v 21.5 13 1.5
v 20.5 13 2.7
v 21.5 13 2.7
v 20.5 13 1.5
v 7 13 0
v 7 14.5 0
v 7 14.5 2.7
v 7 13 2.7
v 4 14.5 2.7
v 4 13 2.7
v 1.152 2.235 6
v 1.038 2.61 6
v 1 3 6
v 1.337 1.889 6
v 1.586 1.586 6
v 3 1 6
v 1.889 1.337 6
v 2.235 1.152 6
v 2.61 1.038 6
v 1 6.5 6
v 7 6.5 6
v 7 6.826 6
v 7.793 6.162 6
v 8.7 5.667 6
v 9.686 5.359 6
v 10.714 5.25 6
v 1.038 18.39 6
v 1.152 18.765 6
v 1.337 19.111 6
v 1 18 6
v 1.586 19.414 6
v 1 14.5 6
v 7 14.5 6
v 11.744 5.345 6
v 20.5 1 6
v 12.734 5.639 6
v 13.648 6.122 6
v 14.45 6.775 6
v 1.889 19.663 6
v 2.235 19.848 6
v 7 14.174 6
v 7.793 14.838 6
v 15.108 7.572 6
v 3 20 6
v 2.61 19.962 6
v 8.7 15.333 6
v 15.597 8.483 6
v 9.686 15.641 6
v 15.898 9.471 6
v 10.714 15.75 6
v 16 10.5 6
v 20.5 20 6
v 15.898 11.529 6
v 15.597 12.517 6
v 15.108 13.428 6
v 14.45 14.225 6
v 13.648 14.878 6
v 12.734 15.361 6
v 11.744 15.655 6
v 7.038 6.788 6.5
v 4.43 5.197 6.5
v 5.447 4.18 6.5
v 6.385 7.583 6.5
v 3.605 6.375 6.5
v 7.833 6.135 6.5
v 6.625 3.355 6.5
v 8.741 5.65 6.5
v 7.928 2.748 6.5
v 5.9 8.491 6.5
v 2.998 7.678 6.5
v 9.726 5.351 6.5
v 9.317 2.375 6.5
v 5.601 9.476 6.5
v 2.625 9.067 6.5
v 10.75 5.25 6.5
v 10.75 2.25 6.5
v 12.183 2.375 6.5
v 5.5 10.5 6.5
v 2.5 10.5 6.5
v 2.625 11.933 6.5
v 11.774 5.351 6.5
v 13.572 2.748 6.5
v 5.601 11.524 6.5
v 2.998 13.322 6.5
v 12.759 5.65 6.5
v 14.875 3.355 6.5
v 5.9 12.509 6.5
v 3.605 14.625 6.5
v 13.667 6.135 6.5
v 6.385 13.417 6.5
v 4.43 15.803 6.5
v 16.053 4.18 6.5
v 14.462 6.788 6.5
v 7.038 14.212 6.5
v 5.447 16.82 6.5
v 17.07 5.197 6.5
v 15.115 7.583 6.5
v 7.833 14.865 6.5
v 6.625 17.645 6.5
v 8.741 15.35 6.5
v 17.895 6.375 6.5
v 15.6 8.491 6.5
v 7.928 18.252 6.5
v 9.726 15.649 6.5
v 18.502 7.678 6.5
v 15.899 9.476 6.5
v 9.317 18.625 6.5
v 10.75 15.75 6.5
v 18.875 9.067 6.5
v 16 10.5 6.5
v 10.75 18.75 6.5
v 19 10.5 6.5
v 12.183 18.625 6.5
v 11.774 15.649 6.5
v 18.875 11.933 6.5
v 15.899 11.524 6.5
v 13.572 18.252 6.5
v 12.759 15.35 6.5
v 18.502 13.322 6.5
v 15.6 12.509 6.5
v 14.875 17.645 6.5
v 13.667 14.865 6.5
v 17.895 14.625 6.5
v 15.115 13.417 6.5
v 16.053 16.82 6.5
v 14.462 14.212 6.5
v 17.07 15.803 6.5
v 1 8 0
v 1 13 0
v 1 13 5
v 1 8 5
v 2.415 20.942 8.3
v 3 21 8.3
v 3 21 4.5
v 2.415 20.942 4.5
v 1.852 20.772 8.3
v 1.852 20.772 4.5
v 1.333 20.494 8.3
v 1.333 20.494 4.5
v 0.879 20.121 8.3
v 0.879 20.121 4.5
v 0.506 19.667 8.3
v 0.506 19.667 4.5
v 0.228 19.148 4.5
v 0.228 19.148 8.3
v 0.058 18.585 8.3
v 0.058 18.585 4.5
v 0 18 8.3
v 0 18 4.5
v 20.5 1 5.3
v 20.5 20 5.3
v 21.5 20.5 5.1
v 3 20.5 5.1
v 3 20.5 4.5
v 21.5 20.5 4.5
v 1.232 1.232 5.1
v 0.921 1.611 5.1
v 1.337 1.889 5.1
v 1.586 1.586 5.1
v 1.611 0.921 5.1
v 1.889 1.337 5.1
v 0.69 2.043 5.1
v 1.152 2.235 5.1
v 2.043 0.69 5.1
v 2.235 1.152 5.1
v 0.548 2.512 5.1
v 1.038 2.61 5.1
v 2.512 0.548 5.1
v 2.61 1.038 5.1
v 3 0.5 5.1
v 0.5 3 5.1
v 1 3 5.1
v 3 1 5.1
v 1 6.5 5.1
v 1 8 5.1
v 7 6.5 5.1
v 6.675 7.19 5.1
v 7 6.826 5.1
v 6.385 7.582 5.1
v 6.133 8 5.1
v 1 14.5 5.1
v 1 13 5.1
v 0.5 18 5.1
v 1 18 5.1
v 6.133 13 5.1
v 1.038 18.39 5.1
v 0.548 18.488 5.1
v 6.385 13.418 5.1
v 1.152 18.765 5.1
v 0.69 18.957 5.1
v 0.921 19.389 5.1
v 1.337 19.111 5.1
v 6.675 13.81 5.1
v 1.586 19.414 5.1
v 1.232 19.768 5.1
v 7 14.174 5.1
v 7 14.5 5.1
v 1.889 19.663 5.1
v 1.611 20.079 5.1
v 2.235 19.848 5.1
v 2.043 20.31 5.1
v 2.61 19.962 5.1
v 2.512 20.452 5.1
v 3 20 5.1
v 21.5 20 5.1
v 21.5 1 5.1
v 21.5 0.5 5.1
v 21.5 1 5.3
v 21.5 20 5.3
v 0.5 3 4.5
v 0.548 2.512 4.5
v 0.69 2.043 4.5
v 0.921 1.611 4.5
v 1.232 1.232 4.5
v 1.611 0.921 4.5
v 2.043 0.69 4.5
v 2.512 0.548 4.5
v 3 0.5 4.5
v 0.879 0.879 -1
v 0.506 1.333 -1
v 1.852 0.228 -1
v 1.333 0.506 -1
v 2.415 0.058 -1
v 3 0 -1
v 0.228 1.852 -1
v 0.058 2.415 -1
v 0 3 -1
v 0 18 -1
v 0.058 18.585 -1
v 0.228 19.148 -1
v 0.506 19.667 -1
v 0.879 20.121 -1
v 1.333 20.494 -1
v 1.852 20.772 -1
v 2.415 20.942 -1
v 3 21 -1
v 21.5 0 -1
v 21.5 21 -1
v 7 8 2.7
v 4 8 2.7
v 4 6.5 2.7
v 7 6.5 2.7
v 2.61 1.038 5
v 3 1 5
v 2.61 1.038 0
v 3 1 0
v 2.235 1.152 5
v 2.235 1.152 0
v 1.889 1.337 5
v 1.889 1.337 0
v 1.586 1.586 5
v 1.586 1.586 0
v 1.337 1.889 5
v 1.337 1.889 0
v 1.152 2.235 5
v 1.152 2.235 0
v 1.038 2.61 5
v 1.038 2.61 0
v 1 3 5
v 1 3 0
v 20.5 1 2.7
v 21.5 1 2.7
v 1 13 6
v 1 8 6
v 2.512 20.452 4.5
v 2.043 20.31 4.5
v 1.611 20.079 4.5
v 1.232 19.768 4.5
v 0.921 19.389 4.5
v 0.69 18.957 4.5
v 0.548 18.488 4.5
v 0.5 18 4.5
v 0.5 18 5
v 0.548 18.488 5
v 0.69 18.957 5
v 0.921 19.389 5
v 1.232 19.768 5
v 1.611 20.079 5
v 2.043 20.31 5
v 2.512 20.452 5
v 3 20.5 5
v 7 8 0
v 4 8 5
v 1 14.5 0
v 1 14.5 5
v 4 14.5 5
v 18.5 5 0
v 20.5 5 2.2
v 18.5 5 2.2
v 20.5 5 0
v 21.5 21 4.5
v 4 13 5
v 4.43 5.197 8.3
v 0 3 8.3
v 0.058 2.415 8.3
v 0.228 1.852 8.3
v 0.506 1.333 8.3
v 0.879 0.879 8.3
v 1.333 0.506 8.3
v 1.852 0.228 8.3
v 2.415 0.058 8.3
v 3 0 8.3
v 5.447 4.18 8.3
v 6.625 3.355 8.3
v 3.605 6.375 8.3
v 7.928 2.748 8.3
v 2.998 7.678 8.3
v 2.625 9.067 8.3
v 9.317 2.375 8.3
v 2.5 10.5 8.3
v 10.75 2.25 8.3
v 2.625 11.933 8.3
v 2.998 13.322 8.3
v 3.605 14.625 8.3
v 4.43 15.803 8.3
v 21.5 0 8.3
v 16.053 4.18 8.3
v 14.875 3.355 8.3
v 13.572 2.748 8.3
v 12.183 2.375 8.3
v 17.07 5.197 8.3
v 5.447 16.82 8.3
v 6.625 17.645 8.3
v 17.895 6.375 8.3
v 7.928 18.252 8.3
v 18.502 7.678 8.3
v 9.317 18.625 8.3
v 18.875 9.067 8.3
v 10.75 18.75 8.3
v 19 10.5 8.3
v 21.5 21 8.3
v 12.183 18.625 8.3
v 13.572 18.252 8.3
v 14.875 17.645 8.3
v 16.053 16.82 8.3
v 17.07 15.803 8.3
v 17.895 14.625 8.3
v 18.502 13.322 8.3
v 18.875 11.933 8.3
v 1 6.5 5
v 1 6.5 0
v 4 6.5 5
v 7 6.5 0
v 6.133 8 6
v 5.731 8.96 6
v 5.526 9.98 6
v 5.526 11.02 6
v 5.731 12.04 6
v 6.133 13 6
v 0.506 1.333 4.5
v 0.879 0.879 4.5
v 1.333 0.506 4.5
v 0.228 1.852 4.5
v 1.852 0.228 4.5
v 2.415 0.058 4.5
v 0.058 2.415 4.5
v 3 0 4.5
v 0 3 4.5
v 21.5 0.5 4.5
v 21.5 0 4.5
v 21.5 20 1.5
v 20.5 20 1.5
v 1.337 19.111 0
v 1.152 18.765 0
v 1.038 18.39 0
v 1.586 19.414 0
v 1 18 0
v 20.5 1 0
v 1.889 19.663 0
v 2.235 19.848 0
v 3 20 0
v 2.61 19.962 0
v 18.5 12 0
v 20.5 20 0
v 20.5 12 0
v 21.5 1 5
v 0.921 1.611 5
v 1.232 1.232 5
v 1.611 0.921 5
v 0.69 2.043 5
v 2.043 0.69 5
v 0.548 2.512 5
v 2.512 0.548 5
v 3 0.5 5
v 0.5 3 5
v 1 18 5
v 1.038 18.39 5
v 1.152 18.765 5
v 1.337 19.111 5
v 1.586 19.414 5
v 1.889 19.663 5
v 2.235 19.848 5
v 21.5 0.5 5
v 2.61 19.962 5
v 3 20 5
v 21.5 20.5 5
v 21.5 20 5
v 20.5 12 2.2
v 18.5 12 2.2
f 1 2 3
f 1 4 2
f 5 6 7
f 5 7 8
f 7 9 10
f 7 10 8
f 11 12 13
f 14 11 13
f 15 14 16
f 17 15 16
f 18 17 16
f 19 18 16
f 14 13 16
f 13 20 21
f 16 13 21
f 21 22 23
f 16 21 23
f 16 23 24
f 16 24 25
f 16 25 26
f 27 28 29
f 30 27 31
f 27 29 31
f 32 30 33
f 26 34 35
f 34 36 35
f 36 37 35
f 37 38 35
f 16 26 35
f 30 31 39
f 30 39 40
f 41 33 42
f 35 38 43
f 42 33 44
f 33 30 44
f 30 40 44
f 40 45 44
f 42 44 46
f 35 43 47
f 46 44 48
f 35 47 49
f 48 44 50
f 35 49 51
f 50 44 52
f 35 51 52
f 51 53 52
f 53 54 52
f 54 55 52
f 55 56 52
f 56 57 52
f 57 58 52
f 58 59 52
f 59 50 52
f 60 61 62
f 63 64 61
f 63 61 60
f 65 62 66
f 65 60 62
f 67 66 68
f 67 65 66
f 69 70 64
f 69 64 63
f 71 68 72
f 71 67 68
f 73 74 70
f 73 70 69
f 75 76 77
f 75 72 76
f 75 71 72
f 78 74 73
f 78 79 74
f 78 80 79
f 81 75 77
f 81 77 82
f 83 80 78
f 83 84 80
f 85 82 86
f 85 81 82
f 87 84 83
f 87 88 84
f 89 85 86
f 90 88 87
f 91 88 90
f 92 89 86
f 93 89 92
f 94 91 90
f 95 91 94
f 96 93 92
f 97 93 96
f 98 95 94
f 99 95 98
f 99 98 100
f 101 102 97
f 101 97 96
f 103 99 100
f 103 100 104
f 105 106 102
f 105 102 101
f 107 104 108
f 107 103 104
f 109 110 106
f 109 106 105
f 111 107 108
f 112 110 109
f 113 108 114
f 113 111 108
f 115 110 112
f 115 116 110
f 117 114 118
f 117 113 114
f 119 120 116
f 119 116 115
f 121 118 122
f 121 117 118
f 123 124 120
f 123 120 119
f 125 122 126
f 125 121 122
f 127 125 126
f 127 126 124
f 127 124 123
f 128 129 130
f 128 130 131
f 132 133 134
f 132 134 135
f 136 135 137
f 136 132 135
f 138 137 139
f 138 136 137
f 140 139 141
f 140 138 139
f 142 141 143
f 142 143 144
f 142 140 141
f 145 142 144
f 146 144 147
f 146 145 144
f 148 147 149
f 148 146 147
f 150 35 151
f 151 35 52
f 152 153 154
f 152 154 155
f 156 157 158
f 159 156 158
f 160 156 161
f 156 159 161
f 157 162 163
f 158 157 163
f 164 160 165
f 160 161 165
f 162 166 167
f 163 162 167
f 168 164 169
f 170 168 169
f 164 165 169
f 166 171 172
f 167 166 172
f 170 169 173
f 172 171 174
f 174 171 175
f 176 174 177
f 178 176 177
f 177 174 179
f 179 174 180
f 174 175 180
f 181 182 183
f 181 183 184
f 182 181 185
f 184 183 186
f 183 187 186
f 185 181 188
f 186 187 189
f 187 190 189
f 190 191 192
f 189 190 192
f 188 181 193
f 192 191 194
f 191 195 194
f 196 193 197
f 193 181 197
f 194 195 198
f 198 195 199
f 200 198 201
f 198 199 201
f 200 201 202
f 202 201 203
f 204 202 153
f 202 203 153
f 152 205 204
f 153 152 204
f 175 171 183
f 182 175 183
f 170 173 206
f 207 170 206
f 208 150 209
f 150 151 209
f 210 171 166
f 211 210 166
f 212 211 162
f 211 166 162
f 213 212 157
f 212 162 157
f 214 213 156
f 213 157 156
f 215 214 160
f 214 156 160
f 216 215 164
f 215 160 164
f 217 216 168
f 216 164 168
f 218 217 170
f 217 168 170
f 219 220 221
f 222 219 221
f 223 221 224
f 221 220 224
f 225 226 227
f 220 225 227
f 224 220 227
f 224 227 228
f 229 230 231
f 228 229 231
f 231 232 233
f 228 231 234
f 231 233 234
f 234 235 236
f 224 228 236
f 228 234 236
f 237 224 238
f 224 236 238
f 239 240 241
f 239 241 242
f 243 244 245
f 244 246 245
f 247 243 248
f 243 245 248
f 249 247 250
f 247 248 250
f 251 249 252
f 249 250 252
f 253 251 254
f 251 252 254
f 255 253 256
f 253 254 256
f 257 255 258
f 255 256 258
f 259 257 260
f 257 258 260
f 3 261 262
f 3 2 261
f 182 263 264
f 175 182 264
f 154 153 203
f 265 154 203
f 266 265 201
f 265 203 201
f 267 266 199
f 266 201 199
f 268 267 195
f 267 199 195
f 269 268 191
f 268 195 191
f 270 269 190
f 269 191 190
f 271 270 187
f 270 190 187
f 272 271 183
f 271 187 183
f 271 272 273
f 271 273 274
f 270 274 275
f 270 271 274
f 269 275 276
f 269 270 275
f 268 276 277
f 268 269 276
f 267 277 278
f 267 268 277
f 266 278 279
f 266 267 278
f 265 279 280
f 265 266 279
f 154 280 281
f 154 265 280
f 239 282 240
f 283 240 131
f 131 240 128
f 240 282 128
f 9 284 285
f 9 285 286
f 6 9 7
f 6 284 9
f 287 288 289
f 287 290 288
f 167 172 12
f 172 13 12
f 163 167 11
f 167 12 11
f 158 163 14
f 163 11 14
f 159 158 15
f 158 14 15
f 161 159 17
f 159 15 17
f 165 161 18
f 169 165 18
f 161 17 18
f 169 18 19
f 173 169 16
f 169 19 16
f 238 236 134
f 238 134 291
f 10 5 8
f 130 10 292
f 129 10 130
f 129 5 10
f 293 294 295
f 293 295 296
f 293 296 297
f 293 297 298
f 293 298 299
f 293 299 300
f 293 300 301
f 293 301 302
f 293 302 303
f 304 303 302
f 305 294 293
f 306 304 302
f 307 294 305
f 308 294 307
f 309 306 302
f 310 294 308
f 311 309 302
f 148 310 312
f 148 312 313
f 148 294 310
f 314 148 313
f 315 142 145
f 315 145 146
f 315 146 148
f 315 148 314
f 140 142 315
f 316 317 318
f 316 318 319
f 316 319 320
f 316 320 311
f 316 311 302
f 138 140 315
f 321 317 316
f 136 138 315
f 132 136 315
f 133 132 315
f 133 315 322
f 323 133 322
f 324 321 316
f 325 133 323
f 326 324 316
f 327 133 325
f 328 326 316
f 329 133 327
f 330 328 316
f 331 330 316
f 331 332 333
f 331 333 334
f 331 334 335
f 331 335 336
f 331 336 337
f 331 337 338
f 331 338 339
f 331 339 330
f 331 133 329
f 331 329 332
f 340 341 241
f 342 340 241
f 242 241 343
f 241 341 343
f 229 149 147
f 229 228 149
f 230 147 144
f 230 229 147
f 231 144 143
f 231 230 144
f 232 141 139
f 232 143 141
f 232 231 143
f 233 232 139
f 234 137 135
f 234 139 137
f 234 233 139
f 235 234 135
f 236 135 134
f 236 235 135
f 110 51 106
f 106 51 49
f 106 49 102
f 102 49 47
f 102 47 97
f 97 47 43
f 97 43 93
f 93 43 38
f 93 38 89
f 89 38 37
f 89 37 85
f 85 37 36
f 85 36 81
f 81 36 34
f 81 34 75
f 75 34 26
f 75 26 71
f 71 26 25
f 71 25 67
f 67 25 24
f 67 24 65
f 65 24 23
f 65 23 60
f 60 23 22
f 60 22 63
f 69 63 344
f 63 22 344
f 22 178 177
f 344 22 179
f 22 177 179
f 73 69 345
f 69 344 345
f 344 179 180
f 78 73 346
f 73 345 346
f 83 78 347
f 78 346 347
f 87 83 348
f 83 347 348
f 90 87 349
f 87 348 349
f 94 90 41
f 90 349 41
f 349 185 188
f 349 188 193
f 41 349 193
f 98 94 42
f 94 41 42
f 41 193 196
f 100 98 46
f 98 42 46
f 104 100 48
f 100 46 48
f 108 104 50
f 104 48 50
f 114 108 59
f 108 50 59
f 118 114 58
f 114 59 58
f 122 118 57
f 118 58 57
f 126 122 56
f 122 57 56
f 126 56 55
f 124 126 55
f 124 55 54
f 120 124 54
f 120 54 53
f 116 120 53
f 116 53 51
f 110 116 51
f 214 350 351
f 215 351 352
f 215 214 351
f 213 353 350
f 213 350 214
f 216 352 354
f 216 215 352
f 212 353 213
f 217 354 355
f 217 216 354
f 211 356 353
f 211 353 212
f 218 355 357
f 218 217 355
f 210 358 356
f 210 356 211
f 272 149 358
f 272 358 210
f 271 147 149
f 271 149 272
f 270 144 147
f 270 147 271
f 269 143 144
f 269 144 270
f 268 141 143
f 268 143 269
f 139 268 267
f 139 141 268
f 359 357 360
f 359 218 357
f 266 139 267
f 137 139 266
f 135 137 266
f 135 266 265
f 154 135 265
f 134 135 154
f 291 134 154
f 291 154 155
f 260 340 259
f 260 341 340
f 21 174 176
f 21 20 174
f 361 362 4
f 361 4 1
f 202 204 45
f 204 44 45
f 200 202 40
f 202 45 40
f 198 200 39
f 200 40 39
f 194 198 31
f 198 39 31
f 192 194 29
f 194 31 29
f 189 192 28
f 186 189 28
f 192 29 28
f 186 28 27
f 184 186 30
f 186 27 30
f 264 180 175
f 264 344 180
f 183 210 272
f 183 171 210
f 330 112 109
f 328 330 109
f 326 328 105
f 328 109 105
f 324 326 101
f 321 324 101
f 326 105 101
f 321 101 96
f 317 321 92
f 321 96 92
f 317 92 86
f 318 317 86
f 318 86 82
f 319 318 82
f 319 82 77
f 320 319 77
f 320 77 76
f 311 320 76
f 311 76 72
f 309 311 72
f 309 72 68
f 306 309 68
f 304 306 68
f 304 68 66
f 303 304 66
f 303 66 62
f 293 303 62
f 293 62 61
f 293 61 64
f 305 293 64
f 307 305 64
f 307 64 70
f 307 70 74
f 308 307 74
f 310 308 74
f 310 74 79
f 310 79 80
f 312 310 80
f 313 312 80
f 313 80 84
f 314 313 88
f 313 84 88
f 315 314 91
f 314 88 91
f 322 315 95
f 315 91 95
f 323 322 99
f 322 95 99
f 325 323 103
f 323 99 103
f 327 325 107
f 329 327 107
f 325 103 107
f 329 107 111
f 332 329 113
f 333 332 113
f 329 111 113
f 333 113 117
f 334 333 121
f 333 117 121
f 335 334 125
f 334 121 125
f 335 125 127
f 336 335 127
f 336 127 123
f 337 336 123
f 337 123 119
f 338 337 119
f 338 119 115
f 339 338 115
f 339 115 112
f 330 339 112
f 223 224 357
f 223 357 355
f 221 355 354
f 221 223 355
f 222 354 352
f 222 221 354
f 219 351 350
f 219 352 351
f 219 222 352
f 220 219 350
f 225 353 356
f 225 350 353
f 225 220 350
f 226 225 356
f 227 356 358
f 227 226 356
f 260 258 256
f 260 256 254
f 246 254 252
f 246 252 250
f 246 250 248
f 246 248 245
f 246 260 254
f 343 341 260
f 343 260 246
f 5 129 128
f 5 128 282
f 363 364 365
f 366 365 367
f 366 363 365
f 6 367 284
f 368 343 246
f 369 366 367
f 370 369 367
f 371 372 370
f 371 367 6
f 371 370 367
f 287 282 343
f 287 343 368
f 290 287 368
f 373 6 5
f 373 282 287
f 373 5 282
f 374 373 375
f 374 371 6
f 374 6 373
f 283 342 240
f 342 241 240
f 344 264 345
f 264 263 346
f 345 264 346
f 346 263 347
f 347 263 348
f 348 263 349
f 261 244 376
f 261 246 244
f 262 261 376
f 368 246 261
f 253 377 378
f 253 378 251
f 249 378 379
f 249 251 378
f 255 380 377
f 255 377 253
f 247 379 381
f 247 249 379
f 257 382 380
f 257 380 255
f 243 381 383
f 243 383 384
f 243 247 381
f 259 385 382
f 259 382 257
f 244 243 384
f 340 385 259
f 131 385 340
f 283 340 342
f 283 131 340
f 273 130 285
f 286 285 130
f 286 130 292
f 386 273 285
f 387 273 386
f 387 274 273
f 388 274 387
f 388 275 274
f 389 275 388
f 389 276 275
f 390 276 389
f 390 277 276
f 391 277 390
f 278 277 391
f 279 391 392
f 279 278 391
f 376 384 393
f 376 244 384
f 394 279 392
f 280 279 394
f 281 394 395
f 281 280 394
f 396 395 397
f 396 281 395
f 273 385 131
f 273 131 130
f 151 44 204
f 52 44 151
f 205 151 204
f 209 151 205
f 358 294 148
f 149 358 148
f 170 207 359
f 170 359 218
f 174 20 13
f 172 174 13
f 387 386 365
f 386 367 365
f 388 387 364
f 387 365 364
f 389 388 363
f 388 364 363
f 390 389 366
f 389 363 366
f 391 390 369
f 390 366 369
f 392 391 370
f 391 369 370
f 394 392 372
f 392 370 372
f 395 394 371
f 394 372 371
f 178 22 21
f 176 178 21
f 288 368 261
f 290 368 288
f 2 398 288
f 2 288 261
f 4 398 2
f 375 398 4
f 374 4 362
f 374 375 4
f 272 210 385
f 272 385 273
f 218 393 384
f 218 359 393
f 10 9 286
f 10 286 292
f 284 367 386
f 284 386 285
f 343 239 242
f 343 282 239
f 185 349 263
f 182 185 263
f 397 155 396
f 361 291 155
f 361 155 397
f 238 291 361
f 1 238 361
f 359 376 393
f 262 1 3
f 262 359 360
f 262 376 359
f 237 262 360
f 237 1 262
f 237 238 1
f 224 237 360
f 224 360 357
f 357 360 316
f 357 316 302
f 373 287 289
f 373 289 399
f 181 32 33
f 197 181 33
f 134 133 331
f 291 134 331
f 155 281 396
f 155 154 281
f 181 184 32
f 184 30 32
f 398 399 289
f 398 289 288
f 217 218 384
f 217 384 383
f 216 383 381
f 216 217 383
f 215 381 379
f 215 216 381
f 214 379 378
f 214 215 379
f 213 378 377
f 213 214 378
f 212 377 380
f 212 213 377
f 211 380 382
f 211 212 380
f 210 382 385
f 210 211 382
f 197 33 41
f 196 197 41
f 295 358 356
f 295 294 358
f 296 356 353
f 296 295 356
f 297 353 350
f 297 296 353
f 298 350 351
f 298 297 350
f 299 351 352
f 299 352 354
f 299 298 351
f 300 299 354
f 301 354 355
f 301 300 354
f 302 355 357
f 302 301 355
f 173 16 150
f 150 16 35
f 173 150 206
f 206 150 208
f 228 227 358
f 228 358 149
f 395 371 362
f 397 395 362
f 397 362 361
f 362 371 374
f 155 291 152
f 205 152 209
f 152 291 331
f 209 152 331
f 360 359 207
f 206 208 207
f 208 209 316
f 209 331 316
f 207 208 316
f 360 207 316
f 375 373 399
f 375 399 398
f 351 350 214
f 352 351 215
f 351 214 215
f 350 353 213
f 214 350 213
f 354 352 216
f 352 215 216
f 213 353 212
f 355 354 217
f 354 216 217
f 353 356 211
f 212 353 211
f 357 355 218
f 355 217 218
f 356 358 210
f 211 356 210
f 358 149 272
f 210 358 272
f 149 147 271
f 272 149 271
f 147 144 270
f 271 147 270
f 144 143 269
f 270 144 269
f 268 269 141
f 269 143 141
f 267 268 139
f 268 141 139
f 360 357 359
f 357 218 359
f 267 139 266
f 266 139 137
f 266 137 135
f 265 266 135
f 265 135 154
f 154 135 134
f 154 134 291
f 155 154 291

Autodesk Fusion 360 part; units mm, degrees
sketch "Sketch2" plane through (0, 0, 0) normal (0, 0, 1) x (1, 0, 0)
  line L0 (3, 21) -> (21.5, 21)
  line L1 (21.5, 21) -> (21.5, 0)
  line L2 (21.5, 0) -> (3, 0)
  line L3 (0, 3) -> (0, 18)
  line L4 (20.5, 20) -> (3, 20)
  line L5 (1, 18) -> (1, 3)
  line L6 (3, 1) -> (20.5, 1)
  line L7 (20.5, 1) -> (20.5, 20)
  line L8 (20.5, 20) -> (21.5, 20)
  line L9 (20.5, 1) -> (21.5, 1)
  line L10 (20.5, 13) -> (21.5, 13)
  line L11 (20.5, 5) -> (18.5, 5)
  line L12 (18.5, 5) -> (18.5, 12)
  line L13 (18.5, 12) -> (20.5, 12)
  line L14 (20.5, 12) -> (20.5, 5)
  line L15 (1, 6.5) -> (4, 6.5)
  line L16 (4, 6.5) -> (4, 8)
  line L17 (4, 8) -> (1, 8)
  line L18 (1, 8) -> (1, 6.5)
  line L19 (1, 14.5) -> (4, 14.5)
  line L20 (4, 14.5) -> (4, 13)
  line L21 (4, 13) -> (1, 13)
  line L22 (1, 13) -> (1, 14.5)
  line L23 (4, 8) -> (7, 8)
  line L24 (7, 8) -> (7, 6.5)
  line L25 (7, 6.5) -> (4, 6.5)
  line L26 (4, 6.5) -> (4, 8)
  line L27 (4, 14.5) -> (7, 14.5)
  line L28 (7, 14.5) -> (7, 13)
  line L29 (7, 13) -> (4, 13)
  line L30 (4, 13) -> (4, 14.5)
  arc A0 (3, 20) -> (1, 18) centre (3, 18) ccw
  arc A1 (3, 21) -> (0, 18) centre (3, 18) ccw
  arc A2 (1, 3) -> (3, 1) centre (3, 3) ccw
  arc A3 (0, 3) -> (3, 0) centre (3, 3) ccw
  line L31 (21.5, 0.5) -> (3, 0.5)
  arc A4 (0.5, 3) -> (3, 0.5) centre (3, 3) ccw
  line L32 (0.5, 3) -> (0.5, 18)
  arc A5 (3, 20.5) -> (0.5, 18) centre (3, 18) ccw
  line L33 (3, 20.5) -> (21.5, 20.5)
  line L34 (21.5, 10.5) -> (0, 10.5) construction
  circle A6 centre (10.75, 10.5) radius 8.25
  circle A7 centre (10.75, 10.5) radius 5.25
  point P0 (0, 21)
  dimension "d1" = 21.5
  dimension "d2" = 21
  dimension "d3" = 12
  dimension "d4" = 2
  dimension "d5" = 7
  dimension "d6" = 3
  dimension "d7" = 1.5
  dimension "d8" = 3
  dimension "d9" = 5.5
  dimension "d10" = 5.5
  dimension "d11" = 2
  dimension "d12" = 3
  dimension "d13" = 2
  dimension "d14" = 3
  dimension "d23" = 0.5
  dimension "d28" = 16.5
  dimension "d29" = 10.5
extrude "Extrude1" add sketch "Sketch2" along normal blind 5 contours L1 L4 L5 L6 L8 L9 L18 L22 A0 A2 L31 A4 L32 A5 L33 | L5 L19 L21 L22 A6 | L19 L20 L21 L30 A6 | L5 L15 L17 L18 A6 | L15 L16 L17 L26 A6 makes body 1
extrude "Extrude2" add sketch "Sketch2" against normal blind 1 bodies 1
extrude "Extrude3" add sketch "Sketch2" along normal blind 2.7 contours L1 L7 L9 L10 L14 | L20 L27 L28 L29 L30 A7 | L16 L23 L24 L25 L26 A7 | L28 L29 A7 | L23 L24 A7 bodies 1
extrude "Extrude4" add sketch "Sketch2" along normal blind 2.2 contours L7 L11 L12 L13 L14 A6 | L12 L13 A6 bodies 1
extrude "Extrude5" add sketch "Sketch2" along normal blind 4.5 contours L0 L1 L2 L3 A1 A3 L31 A4 L32 A5 L33 bodies 1
extrude "Extrude6" add sketch "Sketch2" along normal blind 1.5 contours L1 L7 L8 L10 bodies 1
ref_plane "WorkPlane1" through (10.3898, 10.5, 6) normal (0, 0, 1) x (1, 0, 0)
extrude "Extrude7" add sketch "Sketch2" along normal blind 2.3 from surface at 6 separate body contours L0 L1 L2 L3 A1 A3 L31 A4 L32 A5 L33 | L1 L4 L5 L6 L8 L9 L18 L22 A0 A2 L31 A4 L32 A5 L33 | L1 L7 L8 L10 | L1 L7 L9 L10 L14 | L4 L5 L7 L13 L19 A0 A6 | L5 L6 L7 L11 L12 L15 A2 A6 | L7 L11 L12 L13 L14 A6 | L5 L19 L21 L22 A6 | L5 L17 L21 A6 | L5 L15 L17 L18 A6 makes body 2
extrude "Extrude8" add sketch "Sketch2" along normal blind 0.5 from surface at 6 separate body contours L12 L13 A6 | L12 L13 L15 L19 L24 L25 L27 L28 A6 A7 | L19 L20 L21 L30 A6 | L20 L27 L28 L29 L30 A7 | L17 L21 L23 L29 A6 A7 | L15 L16 L17 L26 A6 | L16 L23 L24 L25 L26 A7 makes body 3
combine "Combine1" operation add target body 2 tool bodies 3
extrude "Extrude9" add sketch "Sketch2" against normal blind 0.9 from surface at 6 separate body contours L1 L4 L5 L6 L8 L9 L18 L22 A0 A2 L31 A4 L32 A5 L33 makes body 4
extrude "Extrude10" add sketch "Sketch2" against normal blind 1.5 from surface at 6 contours L0 L1 L2 L3 A1 A3 L31 A4 L32 A5 L33 bodies 2 4
extrude "Extrude11" add sketch "Sketch2" against normal blind 0.7 from surface at 6 contours L1 L7 L8 L10 | L1 L7 L9 L10 L14 bodies 2
extrude "Extrude12" add sketch "Sketch2" against normal blind 0.9 from surface at 6 separate body contours L5 L19 L21 L22 A6 | L19 L20 L21 L30 A6 | L5 L15 L17 L18 A6 | L20 L27 L28 L29 L30 A7 | L15 L16 L17 L26 A6 | L16 L23 L24 L25 L26 A7 makes body 5 at (4, 14, 6) makes body 6 at (2.7112, 7.5, 6)
combine "Combine2" operation add target body 2 tool bodies 5 6
